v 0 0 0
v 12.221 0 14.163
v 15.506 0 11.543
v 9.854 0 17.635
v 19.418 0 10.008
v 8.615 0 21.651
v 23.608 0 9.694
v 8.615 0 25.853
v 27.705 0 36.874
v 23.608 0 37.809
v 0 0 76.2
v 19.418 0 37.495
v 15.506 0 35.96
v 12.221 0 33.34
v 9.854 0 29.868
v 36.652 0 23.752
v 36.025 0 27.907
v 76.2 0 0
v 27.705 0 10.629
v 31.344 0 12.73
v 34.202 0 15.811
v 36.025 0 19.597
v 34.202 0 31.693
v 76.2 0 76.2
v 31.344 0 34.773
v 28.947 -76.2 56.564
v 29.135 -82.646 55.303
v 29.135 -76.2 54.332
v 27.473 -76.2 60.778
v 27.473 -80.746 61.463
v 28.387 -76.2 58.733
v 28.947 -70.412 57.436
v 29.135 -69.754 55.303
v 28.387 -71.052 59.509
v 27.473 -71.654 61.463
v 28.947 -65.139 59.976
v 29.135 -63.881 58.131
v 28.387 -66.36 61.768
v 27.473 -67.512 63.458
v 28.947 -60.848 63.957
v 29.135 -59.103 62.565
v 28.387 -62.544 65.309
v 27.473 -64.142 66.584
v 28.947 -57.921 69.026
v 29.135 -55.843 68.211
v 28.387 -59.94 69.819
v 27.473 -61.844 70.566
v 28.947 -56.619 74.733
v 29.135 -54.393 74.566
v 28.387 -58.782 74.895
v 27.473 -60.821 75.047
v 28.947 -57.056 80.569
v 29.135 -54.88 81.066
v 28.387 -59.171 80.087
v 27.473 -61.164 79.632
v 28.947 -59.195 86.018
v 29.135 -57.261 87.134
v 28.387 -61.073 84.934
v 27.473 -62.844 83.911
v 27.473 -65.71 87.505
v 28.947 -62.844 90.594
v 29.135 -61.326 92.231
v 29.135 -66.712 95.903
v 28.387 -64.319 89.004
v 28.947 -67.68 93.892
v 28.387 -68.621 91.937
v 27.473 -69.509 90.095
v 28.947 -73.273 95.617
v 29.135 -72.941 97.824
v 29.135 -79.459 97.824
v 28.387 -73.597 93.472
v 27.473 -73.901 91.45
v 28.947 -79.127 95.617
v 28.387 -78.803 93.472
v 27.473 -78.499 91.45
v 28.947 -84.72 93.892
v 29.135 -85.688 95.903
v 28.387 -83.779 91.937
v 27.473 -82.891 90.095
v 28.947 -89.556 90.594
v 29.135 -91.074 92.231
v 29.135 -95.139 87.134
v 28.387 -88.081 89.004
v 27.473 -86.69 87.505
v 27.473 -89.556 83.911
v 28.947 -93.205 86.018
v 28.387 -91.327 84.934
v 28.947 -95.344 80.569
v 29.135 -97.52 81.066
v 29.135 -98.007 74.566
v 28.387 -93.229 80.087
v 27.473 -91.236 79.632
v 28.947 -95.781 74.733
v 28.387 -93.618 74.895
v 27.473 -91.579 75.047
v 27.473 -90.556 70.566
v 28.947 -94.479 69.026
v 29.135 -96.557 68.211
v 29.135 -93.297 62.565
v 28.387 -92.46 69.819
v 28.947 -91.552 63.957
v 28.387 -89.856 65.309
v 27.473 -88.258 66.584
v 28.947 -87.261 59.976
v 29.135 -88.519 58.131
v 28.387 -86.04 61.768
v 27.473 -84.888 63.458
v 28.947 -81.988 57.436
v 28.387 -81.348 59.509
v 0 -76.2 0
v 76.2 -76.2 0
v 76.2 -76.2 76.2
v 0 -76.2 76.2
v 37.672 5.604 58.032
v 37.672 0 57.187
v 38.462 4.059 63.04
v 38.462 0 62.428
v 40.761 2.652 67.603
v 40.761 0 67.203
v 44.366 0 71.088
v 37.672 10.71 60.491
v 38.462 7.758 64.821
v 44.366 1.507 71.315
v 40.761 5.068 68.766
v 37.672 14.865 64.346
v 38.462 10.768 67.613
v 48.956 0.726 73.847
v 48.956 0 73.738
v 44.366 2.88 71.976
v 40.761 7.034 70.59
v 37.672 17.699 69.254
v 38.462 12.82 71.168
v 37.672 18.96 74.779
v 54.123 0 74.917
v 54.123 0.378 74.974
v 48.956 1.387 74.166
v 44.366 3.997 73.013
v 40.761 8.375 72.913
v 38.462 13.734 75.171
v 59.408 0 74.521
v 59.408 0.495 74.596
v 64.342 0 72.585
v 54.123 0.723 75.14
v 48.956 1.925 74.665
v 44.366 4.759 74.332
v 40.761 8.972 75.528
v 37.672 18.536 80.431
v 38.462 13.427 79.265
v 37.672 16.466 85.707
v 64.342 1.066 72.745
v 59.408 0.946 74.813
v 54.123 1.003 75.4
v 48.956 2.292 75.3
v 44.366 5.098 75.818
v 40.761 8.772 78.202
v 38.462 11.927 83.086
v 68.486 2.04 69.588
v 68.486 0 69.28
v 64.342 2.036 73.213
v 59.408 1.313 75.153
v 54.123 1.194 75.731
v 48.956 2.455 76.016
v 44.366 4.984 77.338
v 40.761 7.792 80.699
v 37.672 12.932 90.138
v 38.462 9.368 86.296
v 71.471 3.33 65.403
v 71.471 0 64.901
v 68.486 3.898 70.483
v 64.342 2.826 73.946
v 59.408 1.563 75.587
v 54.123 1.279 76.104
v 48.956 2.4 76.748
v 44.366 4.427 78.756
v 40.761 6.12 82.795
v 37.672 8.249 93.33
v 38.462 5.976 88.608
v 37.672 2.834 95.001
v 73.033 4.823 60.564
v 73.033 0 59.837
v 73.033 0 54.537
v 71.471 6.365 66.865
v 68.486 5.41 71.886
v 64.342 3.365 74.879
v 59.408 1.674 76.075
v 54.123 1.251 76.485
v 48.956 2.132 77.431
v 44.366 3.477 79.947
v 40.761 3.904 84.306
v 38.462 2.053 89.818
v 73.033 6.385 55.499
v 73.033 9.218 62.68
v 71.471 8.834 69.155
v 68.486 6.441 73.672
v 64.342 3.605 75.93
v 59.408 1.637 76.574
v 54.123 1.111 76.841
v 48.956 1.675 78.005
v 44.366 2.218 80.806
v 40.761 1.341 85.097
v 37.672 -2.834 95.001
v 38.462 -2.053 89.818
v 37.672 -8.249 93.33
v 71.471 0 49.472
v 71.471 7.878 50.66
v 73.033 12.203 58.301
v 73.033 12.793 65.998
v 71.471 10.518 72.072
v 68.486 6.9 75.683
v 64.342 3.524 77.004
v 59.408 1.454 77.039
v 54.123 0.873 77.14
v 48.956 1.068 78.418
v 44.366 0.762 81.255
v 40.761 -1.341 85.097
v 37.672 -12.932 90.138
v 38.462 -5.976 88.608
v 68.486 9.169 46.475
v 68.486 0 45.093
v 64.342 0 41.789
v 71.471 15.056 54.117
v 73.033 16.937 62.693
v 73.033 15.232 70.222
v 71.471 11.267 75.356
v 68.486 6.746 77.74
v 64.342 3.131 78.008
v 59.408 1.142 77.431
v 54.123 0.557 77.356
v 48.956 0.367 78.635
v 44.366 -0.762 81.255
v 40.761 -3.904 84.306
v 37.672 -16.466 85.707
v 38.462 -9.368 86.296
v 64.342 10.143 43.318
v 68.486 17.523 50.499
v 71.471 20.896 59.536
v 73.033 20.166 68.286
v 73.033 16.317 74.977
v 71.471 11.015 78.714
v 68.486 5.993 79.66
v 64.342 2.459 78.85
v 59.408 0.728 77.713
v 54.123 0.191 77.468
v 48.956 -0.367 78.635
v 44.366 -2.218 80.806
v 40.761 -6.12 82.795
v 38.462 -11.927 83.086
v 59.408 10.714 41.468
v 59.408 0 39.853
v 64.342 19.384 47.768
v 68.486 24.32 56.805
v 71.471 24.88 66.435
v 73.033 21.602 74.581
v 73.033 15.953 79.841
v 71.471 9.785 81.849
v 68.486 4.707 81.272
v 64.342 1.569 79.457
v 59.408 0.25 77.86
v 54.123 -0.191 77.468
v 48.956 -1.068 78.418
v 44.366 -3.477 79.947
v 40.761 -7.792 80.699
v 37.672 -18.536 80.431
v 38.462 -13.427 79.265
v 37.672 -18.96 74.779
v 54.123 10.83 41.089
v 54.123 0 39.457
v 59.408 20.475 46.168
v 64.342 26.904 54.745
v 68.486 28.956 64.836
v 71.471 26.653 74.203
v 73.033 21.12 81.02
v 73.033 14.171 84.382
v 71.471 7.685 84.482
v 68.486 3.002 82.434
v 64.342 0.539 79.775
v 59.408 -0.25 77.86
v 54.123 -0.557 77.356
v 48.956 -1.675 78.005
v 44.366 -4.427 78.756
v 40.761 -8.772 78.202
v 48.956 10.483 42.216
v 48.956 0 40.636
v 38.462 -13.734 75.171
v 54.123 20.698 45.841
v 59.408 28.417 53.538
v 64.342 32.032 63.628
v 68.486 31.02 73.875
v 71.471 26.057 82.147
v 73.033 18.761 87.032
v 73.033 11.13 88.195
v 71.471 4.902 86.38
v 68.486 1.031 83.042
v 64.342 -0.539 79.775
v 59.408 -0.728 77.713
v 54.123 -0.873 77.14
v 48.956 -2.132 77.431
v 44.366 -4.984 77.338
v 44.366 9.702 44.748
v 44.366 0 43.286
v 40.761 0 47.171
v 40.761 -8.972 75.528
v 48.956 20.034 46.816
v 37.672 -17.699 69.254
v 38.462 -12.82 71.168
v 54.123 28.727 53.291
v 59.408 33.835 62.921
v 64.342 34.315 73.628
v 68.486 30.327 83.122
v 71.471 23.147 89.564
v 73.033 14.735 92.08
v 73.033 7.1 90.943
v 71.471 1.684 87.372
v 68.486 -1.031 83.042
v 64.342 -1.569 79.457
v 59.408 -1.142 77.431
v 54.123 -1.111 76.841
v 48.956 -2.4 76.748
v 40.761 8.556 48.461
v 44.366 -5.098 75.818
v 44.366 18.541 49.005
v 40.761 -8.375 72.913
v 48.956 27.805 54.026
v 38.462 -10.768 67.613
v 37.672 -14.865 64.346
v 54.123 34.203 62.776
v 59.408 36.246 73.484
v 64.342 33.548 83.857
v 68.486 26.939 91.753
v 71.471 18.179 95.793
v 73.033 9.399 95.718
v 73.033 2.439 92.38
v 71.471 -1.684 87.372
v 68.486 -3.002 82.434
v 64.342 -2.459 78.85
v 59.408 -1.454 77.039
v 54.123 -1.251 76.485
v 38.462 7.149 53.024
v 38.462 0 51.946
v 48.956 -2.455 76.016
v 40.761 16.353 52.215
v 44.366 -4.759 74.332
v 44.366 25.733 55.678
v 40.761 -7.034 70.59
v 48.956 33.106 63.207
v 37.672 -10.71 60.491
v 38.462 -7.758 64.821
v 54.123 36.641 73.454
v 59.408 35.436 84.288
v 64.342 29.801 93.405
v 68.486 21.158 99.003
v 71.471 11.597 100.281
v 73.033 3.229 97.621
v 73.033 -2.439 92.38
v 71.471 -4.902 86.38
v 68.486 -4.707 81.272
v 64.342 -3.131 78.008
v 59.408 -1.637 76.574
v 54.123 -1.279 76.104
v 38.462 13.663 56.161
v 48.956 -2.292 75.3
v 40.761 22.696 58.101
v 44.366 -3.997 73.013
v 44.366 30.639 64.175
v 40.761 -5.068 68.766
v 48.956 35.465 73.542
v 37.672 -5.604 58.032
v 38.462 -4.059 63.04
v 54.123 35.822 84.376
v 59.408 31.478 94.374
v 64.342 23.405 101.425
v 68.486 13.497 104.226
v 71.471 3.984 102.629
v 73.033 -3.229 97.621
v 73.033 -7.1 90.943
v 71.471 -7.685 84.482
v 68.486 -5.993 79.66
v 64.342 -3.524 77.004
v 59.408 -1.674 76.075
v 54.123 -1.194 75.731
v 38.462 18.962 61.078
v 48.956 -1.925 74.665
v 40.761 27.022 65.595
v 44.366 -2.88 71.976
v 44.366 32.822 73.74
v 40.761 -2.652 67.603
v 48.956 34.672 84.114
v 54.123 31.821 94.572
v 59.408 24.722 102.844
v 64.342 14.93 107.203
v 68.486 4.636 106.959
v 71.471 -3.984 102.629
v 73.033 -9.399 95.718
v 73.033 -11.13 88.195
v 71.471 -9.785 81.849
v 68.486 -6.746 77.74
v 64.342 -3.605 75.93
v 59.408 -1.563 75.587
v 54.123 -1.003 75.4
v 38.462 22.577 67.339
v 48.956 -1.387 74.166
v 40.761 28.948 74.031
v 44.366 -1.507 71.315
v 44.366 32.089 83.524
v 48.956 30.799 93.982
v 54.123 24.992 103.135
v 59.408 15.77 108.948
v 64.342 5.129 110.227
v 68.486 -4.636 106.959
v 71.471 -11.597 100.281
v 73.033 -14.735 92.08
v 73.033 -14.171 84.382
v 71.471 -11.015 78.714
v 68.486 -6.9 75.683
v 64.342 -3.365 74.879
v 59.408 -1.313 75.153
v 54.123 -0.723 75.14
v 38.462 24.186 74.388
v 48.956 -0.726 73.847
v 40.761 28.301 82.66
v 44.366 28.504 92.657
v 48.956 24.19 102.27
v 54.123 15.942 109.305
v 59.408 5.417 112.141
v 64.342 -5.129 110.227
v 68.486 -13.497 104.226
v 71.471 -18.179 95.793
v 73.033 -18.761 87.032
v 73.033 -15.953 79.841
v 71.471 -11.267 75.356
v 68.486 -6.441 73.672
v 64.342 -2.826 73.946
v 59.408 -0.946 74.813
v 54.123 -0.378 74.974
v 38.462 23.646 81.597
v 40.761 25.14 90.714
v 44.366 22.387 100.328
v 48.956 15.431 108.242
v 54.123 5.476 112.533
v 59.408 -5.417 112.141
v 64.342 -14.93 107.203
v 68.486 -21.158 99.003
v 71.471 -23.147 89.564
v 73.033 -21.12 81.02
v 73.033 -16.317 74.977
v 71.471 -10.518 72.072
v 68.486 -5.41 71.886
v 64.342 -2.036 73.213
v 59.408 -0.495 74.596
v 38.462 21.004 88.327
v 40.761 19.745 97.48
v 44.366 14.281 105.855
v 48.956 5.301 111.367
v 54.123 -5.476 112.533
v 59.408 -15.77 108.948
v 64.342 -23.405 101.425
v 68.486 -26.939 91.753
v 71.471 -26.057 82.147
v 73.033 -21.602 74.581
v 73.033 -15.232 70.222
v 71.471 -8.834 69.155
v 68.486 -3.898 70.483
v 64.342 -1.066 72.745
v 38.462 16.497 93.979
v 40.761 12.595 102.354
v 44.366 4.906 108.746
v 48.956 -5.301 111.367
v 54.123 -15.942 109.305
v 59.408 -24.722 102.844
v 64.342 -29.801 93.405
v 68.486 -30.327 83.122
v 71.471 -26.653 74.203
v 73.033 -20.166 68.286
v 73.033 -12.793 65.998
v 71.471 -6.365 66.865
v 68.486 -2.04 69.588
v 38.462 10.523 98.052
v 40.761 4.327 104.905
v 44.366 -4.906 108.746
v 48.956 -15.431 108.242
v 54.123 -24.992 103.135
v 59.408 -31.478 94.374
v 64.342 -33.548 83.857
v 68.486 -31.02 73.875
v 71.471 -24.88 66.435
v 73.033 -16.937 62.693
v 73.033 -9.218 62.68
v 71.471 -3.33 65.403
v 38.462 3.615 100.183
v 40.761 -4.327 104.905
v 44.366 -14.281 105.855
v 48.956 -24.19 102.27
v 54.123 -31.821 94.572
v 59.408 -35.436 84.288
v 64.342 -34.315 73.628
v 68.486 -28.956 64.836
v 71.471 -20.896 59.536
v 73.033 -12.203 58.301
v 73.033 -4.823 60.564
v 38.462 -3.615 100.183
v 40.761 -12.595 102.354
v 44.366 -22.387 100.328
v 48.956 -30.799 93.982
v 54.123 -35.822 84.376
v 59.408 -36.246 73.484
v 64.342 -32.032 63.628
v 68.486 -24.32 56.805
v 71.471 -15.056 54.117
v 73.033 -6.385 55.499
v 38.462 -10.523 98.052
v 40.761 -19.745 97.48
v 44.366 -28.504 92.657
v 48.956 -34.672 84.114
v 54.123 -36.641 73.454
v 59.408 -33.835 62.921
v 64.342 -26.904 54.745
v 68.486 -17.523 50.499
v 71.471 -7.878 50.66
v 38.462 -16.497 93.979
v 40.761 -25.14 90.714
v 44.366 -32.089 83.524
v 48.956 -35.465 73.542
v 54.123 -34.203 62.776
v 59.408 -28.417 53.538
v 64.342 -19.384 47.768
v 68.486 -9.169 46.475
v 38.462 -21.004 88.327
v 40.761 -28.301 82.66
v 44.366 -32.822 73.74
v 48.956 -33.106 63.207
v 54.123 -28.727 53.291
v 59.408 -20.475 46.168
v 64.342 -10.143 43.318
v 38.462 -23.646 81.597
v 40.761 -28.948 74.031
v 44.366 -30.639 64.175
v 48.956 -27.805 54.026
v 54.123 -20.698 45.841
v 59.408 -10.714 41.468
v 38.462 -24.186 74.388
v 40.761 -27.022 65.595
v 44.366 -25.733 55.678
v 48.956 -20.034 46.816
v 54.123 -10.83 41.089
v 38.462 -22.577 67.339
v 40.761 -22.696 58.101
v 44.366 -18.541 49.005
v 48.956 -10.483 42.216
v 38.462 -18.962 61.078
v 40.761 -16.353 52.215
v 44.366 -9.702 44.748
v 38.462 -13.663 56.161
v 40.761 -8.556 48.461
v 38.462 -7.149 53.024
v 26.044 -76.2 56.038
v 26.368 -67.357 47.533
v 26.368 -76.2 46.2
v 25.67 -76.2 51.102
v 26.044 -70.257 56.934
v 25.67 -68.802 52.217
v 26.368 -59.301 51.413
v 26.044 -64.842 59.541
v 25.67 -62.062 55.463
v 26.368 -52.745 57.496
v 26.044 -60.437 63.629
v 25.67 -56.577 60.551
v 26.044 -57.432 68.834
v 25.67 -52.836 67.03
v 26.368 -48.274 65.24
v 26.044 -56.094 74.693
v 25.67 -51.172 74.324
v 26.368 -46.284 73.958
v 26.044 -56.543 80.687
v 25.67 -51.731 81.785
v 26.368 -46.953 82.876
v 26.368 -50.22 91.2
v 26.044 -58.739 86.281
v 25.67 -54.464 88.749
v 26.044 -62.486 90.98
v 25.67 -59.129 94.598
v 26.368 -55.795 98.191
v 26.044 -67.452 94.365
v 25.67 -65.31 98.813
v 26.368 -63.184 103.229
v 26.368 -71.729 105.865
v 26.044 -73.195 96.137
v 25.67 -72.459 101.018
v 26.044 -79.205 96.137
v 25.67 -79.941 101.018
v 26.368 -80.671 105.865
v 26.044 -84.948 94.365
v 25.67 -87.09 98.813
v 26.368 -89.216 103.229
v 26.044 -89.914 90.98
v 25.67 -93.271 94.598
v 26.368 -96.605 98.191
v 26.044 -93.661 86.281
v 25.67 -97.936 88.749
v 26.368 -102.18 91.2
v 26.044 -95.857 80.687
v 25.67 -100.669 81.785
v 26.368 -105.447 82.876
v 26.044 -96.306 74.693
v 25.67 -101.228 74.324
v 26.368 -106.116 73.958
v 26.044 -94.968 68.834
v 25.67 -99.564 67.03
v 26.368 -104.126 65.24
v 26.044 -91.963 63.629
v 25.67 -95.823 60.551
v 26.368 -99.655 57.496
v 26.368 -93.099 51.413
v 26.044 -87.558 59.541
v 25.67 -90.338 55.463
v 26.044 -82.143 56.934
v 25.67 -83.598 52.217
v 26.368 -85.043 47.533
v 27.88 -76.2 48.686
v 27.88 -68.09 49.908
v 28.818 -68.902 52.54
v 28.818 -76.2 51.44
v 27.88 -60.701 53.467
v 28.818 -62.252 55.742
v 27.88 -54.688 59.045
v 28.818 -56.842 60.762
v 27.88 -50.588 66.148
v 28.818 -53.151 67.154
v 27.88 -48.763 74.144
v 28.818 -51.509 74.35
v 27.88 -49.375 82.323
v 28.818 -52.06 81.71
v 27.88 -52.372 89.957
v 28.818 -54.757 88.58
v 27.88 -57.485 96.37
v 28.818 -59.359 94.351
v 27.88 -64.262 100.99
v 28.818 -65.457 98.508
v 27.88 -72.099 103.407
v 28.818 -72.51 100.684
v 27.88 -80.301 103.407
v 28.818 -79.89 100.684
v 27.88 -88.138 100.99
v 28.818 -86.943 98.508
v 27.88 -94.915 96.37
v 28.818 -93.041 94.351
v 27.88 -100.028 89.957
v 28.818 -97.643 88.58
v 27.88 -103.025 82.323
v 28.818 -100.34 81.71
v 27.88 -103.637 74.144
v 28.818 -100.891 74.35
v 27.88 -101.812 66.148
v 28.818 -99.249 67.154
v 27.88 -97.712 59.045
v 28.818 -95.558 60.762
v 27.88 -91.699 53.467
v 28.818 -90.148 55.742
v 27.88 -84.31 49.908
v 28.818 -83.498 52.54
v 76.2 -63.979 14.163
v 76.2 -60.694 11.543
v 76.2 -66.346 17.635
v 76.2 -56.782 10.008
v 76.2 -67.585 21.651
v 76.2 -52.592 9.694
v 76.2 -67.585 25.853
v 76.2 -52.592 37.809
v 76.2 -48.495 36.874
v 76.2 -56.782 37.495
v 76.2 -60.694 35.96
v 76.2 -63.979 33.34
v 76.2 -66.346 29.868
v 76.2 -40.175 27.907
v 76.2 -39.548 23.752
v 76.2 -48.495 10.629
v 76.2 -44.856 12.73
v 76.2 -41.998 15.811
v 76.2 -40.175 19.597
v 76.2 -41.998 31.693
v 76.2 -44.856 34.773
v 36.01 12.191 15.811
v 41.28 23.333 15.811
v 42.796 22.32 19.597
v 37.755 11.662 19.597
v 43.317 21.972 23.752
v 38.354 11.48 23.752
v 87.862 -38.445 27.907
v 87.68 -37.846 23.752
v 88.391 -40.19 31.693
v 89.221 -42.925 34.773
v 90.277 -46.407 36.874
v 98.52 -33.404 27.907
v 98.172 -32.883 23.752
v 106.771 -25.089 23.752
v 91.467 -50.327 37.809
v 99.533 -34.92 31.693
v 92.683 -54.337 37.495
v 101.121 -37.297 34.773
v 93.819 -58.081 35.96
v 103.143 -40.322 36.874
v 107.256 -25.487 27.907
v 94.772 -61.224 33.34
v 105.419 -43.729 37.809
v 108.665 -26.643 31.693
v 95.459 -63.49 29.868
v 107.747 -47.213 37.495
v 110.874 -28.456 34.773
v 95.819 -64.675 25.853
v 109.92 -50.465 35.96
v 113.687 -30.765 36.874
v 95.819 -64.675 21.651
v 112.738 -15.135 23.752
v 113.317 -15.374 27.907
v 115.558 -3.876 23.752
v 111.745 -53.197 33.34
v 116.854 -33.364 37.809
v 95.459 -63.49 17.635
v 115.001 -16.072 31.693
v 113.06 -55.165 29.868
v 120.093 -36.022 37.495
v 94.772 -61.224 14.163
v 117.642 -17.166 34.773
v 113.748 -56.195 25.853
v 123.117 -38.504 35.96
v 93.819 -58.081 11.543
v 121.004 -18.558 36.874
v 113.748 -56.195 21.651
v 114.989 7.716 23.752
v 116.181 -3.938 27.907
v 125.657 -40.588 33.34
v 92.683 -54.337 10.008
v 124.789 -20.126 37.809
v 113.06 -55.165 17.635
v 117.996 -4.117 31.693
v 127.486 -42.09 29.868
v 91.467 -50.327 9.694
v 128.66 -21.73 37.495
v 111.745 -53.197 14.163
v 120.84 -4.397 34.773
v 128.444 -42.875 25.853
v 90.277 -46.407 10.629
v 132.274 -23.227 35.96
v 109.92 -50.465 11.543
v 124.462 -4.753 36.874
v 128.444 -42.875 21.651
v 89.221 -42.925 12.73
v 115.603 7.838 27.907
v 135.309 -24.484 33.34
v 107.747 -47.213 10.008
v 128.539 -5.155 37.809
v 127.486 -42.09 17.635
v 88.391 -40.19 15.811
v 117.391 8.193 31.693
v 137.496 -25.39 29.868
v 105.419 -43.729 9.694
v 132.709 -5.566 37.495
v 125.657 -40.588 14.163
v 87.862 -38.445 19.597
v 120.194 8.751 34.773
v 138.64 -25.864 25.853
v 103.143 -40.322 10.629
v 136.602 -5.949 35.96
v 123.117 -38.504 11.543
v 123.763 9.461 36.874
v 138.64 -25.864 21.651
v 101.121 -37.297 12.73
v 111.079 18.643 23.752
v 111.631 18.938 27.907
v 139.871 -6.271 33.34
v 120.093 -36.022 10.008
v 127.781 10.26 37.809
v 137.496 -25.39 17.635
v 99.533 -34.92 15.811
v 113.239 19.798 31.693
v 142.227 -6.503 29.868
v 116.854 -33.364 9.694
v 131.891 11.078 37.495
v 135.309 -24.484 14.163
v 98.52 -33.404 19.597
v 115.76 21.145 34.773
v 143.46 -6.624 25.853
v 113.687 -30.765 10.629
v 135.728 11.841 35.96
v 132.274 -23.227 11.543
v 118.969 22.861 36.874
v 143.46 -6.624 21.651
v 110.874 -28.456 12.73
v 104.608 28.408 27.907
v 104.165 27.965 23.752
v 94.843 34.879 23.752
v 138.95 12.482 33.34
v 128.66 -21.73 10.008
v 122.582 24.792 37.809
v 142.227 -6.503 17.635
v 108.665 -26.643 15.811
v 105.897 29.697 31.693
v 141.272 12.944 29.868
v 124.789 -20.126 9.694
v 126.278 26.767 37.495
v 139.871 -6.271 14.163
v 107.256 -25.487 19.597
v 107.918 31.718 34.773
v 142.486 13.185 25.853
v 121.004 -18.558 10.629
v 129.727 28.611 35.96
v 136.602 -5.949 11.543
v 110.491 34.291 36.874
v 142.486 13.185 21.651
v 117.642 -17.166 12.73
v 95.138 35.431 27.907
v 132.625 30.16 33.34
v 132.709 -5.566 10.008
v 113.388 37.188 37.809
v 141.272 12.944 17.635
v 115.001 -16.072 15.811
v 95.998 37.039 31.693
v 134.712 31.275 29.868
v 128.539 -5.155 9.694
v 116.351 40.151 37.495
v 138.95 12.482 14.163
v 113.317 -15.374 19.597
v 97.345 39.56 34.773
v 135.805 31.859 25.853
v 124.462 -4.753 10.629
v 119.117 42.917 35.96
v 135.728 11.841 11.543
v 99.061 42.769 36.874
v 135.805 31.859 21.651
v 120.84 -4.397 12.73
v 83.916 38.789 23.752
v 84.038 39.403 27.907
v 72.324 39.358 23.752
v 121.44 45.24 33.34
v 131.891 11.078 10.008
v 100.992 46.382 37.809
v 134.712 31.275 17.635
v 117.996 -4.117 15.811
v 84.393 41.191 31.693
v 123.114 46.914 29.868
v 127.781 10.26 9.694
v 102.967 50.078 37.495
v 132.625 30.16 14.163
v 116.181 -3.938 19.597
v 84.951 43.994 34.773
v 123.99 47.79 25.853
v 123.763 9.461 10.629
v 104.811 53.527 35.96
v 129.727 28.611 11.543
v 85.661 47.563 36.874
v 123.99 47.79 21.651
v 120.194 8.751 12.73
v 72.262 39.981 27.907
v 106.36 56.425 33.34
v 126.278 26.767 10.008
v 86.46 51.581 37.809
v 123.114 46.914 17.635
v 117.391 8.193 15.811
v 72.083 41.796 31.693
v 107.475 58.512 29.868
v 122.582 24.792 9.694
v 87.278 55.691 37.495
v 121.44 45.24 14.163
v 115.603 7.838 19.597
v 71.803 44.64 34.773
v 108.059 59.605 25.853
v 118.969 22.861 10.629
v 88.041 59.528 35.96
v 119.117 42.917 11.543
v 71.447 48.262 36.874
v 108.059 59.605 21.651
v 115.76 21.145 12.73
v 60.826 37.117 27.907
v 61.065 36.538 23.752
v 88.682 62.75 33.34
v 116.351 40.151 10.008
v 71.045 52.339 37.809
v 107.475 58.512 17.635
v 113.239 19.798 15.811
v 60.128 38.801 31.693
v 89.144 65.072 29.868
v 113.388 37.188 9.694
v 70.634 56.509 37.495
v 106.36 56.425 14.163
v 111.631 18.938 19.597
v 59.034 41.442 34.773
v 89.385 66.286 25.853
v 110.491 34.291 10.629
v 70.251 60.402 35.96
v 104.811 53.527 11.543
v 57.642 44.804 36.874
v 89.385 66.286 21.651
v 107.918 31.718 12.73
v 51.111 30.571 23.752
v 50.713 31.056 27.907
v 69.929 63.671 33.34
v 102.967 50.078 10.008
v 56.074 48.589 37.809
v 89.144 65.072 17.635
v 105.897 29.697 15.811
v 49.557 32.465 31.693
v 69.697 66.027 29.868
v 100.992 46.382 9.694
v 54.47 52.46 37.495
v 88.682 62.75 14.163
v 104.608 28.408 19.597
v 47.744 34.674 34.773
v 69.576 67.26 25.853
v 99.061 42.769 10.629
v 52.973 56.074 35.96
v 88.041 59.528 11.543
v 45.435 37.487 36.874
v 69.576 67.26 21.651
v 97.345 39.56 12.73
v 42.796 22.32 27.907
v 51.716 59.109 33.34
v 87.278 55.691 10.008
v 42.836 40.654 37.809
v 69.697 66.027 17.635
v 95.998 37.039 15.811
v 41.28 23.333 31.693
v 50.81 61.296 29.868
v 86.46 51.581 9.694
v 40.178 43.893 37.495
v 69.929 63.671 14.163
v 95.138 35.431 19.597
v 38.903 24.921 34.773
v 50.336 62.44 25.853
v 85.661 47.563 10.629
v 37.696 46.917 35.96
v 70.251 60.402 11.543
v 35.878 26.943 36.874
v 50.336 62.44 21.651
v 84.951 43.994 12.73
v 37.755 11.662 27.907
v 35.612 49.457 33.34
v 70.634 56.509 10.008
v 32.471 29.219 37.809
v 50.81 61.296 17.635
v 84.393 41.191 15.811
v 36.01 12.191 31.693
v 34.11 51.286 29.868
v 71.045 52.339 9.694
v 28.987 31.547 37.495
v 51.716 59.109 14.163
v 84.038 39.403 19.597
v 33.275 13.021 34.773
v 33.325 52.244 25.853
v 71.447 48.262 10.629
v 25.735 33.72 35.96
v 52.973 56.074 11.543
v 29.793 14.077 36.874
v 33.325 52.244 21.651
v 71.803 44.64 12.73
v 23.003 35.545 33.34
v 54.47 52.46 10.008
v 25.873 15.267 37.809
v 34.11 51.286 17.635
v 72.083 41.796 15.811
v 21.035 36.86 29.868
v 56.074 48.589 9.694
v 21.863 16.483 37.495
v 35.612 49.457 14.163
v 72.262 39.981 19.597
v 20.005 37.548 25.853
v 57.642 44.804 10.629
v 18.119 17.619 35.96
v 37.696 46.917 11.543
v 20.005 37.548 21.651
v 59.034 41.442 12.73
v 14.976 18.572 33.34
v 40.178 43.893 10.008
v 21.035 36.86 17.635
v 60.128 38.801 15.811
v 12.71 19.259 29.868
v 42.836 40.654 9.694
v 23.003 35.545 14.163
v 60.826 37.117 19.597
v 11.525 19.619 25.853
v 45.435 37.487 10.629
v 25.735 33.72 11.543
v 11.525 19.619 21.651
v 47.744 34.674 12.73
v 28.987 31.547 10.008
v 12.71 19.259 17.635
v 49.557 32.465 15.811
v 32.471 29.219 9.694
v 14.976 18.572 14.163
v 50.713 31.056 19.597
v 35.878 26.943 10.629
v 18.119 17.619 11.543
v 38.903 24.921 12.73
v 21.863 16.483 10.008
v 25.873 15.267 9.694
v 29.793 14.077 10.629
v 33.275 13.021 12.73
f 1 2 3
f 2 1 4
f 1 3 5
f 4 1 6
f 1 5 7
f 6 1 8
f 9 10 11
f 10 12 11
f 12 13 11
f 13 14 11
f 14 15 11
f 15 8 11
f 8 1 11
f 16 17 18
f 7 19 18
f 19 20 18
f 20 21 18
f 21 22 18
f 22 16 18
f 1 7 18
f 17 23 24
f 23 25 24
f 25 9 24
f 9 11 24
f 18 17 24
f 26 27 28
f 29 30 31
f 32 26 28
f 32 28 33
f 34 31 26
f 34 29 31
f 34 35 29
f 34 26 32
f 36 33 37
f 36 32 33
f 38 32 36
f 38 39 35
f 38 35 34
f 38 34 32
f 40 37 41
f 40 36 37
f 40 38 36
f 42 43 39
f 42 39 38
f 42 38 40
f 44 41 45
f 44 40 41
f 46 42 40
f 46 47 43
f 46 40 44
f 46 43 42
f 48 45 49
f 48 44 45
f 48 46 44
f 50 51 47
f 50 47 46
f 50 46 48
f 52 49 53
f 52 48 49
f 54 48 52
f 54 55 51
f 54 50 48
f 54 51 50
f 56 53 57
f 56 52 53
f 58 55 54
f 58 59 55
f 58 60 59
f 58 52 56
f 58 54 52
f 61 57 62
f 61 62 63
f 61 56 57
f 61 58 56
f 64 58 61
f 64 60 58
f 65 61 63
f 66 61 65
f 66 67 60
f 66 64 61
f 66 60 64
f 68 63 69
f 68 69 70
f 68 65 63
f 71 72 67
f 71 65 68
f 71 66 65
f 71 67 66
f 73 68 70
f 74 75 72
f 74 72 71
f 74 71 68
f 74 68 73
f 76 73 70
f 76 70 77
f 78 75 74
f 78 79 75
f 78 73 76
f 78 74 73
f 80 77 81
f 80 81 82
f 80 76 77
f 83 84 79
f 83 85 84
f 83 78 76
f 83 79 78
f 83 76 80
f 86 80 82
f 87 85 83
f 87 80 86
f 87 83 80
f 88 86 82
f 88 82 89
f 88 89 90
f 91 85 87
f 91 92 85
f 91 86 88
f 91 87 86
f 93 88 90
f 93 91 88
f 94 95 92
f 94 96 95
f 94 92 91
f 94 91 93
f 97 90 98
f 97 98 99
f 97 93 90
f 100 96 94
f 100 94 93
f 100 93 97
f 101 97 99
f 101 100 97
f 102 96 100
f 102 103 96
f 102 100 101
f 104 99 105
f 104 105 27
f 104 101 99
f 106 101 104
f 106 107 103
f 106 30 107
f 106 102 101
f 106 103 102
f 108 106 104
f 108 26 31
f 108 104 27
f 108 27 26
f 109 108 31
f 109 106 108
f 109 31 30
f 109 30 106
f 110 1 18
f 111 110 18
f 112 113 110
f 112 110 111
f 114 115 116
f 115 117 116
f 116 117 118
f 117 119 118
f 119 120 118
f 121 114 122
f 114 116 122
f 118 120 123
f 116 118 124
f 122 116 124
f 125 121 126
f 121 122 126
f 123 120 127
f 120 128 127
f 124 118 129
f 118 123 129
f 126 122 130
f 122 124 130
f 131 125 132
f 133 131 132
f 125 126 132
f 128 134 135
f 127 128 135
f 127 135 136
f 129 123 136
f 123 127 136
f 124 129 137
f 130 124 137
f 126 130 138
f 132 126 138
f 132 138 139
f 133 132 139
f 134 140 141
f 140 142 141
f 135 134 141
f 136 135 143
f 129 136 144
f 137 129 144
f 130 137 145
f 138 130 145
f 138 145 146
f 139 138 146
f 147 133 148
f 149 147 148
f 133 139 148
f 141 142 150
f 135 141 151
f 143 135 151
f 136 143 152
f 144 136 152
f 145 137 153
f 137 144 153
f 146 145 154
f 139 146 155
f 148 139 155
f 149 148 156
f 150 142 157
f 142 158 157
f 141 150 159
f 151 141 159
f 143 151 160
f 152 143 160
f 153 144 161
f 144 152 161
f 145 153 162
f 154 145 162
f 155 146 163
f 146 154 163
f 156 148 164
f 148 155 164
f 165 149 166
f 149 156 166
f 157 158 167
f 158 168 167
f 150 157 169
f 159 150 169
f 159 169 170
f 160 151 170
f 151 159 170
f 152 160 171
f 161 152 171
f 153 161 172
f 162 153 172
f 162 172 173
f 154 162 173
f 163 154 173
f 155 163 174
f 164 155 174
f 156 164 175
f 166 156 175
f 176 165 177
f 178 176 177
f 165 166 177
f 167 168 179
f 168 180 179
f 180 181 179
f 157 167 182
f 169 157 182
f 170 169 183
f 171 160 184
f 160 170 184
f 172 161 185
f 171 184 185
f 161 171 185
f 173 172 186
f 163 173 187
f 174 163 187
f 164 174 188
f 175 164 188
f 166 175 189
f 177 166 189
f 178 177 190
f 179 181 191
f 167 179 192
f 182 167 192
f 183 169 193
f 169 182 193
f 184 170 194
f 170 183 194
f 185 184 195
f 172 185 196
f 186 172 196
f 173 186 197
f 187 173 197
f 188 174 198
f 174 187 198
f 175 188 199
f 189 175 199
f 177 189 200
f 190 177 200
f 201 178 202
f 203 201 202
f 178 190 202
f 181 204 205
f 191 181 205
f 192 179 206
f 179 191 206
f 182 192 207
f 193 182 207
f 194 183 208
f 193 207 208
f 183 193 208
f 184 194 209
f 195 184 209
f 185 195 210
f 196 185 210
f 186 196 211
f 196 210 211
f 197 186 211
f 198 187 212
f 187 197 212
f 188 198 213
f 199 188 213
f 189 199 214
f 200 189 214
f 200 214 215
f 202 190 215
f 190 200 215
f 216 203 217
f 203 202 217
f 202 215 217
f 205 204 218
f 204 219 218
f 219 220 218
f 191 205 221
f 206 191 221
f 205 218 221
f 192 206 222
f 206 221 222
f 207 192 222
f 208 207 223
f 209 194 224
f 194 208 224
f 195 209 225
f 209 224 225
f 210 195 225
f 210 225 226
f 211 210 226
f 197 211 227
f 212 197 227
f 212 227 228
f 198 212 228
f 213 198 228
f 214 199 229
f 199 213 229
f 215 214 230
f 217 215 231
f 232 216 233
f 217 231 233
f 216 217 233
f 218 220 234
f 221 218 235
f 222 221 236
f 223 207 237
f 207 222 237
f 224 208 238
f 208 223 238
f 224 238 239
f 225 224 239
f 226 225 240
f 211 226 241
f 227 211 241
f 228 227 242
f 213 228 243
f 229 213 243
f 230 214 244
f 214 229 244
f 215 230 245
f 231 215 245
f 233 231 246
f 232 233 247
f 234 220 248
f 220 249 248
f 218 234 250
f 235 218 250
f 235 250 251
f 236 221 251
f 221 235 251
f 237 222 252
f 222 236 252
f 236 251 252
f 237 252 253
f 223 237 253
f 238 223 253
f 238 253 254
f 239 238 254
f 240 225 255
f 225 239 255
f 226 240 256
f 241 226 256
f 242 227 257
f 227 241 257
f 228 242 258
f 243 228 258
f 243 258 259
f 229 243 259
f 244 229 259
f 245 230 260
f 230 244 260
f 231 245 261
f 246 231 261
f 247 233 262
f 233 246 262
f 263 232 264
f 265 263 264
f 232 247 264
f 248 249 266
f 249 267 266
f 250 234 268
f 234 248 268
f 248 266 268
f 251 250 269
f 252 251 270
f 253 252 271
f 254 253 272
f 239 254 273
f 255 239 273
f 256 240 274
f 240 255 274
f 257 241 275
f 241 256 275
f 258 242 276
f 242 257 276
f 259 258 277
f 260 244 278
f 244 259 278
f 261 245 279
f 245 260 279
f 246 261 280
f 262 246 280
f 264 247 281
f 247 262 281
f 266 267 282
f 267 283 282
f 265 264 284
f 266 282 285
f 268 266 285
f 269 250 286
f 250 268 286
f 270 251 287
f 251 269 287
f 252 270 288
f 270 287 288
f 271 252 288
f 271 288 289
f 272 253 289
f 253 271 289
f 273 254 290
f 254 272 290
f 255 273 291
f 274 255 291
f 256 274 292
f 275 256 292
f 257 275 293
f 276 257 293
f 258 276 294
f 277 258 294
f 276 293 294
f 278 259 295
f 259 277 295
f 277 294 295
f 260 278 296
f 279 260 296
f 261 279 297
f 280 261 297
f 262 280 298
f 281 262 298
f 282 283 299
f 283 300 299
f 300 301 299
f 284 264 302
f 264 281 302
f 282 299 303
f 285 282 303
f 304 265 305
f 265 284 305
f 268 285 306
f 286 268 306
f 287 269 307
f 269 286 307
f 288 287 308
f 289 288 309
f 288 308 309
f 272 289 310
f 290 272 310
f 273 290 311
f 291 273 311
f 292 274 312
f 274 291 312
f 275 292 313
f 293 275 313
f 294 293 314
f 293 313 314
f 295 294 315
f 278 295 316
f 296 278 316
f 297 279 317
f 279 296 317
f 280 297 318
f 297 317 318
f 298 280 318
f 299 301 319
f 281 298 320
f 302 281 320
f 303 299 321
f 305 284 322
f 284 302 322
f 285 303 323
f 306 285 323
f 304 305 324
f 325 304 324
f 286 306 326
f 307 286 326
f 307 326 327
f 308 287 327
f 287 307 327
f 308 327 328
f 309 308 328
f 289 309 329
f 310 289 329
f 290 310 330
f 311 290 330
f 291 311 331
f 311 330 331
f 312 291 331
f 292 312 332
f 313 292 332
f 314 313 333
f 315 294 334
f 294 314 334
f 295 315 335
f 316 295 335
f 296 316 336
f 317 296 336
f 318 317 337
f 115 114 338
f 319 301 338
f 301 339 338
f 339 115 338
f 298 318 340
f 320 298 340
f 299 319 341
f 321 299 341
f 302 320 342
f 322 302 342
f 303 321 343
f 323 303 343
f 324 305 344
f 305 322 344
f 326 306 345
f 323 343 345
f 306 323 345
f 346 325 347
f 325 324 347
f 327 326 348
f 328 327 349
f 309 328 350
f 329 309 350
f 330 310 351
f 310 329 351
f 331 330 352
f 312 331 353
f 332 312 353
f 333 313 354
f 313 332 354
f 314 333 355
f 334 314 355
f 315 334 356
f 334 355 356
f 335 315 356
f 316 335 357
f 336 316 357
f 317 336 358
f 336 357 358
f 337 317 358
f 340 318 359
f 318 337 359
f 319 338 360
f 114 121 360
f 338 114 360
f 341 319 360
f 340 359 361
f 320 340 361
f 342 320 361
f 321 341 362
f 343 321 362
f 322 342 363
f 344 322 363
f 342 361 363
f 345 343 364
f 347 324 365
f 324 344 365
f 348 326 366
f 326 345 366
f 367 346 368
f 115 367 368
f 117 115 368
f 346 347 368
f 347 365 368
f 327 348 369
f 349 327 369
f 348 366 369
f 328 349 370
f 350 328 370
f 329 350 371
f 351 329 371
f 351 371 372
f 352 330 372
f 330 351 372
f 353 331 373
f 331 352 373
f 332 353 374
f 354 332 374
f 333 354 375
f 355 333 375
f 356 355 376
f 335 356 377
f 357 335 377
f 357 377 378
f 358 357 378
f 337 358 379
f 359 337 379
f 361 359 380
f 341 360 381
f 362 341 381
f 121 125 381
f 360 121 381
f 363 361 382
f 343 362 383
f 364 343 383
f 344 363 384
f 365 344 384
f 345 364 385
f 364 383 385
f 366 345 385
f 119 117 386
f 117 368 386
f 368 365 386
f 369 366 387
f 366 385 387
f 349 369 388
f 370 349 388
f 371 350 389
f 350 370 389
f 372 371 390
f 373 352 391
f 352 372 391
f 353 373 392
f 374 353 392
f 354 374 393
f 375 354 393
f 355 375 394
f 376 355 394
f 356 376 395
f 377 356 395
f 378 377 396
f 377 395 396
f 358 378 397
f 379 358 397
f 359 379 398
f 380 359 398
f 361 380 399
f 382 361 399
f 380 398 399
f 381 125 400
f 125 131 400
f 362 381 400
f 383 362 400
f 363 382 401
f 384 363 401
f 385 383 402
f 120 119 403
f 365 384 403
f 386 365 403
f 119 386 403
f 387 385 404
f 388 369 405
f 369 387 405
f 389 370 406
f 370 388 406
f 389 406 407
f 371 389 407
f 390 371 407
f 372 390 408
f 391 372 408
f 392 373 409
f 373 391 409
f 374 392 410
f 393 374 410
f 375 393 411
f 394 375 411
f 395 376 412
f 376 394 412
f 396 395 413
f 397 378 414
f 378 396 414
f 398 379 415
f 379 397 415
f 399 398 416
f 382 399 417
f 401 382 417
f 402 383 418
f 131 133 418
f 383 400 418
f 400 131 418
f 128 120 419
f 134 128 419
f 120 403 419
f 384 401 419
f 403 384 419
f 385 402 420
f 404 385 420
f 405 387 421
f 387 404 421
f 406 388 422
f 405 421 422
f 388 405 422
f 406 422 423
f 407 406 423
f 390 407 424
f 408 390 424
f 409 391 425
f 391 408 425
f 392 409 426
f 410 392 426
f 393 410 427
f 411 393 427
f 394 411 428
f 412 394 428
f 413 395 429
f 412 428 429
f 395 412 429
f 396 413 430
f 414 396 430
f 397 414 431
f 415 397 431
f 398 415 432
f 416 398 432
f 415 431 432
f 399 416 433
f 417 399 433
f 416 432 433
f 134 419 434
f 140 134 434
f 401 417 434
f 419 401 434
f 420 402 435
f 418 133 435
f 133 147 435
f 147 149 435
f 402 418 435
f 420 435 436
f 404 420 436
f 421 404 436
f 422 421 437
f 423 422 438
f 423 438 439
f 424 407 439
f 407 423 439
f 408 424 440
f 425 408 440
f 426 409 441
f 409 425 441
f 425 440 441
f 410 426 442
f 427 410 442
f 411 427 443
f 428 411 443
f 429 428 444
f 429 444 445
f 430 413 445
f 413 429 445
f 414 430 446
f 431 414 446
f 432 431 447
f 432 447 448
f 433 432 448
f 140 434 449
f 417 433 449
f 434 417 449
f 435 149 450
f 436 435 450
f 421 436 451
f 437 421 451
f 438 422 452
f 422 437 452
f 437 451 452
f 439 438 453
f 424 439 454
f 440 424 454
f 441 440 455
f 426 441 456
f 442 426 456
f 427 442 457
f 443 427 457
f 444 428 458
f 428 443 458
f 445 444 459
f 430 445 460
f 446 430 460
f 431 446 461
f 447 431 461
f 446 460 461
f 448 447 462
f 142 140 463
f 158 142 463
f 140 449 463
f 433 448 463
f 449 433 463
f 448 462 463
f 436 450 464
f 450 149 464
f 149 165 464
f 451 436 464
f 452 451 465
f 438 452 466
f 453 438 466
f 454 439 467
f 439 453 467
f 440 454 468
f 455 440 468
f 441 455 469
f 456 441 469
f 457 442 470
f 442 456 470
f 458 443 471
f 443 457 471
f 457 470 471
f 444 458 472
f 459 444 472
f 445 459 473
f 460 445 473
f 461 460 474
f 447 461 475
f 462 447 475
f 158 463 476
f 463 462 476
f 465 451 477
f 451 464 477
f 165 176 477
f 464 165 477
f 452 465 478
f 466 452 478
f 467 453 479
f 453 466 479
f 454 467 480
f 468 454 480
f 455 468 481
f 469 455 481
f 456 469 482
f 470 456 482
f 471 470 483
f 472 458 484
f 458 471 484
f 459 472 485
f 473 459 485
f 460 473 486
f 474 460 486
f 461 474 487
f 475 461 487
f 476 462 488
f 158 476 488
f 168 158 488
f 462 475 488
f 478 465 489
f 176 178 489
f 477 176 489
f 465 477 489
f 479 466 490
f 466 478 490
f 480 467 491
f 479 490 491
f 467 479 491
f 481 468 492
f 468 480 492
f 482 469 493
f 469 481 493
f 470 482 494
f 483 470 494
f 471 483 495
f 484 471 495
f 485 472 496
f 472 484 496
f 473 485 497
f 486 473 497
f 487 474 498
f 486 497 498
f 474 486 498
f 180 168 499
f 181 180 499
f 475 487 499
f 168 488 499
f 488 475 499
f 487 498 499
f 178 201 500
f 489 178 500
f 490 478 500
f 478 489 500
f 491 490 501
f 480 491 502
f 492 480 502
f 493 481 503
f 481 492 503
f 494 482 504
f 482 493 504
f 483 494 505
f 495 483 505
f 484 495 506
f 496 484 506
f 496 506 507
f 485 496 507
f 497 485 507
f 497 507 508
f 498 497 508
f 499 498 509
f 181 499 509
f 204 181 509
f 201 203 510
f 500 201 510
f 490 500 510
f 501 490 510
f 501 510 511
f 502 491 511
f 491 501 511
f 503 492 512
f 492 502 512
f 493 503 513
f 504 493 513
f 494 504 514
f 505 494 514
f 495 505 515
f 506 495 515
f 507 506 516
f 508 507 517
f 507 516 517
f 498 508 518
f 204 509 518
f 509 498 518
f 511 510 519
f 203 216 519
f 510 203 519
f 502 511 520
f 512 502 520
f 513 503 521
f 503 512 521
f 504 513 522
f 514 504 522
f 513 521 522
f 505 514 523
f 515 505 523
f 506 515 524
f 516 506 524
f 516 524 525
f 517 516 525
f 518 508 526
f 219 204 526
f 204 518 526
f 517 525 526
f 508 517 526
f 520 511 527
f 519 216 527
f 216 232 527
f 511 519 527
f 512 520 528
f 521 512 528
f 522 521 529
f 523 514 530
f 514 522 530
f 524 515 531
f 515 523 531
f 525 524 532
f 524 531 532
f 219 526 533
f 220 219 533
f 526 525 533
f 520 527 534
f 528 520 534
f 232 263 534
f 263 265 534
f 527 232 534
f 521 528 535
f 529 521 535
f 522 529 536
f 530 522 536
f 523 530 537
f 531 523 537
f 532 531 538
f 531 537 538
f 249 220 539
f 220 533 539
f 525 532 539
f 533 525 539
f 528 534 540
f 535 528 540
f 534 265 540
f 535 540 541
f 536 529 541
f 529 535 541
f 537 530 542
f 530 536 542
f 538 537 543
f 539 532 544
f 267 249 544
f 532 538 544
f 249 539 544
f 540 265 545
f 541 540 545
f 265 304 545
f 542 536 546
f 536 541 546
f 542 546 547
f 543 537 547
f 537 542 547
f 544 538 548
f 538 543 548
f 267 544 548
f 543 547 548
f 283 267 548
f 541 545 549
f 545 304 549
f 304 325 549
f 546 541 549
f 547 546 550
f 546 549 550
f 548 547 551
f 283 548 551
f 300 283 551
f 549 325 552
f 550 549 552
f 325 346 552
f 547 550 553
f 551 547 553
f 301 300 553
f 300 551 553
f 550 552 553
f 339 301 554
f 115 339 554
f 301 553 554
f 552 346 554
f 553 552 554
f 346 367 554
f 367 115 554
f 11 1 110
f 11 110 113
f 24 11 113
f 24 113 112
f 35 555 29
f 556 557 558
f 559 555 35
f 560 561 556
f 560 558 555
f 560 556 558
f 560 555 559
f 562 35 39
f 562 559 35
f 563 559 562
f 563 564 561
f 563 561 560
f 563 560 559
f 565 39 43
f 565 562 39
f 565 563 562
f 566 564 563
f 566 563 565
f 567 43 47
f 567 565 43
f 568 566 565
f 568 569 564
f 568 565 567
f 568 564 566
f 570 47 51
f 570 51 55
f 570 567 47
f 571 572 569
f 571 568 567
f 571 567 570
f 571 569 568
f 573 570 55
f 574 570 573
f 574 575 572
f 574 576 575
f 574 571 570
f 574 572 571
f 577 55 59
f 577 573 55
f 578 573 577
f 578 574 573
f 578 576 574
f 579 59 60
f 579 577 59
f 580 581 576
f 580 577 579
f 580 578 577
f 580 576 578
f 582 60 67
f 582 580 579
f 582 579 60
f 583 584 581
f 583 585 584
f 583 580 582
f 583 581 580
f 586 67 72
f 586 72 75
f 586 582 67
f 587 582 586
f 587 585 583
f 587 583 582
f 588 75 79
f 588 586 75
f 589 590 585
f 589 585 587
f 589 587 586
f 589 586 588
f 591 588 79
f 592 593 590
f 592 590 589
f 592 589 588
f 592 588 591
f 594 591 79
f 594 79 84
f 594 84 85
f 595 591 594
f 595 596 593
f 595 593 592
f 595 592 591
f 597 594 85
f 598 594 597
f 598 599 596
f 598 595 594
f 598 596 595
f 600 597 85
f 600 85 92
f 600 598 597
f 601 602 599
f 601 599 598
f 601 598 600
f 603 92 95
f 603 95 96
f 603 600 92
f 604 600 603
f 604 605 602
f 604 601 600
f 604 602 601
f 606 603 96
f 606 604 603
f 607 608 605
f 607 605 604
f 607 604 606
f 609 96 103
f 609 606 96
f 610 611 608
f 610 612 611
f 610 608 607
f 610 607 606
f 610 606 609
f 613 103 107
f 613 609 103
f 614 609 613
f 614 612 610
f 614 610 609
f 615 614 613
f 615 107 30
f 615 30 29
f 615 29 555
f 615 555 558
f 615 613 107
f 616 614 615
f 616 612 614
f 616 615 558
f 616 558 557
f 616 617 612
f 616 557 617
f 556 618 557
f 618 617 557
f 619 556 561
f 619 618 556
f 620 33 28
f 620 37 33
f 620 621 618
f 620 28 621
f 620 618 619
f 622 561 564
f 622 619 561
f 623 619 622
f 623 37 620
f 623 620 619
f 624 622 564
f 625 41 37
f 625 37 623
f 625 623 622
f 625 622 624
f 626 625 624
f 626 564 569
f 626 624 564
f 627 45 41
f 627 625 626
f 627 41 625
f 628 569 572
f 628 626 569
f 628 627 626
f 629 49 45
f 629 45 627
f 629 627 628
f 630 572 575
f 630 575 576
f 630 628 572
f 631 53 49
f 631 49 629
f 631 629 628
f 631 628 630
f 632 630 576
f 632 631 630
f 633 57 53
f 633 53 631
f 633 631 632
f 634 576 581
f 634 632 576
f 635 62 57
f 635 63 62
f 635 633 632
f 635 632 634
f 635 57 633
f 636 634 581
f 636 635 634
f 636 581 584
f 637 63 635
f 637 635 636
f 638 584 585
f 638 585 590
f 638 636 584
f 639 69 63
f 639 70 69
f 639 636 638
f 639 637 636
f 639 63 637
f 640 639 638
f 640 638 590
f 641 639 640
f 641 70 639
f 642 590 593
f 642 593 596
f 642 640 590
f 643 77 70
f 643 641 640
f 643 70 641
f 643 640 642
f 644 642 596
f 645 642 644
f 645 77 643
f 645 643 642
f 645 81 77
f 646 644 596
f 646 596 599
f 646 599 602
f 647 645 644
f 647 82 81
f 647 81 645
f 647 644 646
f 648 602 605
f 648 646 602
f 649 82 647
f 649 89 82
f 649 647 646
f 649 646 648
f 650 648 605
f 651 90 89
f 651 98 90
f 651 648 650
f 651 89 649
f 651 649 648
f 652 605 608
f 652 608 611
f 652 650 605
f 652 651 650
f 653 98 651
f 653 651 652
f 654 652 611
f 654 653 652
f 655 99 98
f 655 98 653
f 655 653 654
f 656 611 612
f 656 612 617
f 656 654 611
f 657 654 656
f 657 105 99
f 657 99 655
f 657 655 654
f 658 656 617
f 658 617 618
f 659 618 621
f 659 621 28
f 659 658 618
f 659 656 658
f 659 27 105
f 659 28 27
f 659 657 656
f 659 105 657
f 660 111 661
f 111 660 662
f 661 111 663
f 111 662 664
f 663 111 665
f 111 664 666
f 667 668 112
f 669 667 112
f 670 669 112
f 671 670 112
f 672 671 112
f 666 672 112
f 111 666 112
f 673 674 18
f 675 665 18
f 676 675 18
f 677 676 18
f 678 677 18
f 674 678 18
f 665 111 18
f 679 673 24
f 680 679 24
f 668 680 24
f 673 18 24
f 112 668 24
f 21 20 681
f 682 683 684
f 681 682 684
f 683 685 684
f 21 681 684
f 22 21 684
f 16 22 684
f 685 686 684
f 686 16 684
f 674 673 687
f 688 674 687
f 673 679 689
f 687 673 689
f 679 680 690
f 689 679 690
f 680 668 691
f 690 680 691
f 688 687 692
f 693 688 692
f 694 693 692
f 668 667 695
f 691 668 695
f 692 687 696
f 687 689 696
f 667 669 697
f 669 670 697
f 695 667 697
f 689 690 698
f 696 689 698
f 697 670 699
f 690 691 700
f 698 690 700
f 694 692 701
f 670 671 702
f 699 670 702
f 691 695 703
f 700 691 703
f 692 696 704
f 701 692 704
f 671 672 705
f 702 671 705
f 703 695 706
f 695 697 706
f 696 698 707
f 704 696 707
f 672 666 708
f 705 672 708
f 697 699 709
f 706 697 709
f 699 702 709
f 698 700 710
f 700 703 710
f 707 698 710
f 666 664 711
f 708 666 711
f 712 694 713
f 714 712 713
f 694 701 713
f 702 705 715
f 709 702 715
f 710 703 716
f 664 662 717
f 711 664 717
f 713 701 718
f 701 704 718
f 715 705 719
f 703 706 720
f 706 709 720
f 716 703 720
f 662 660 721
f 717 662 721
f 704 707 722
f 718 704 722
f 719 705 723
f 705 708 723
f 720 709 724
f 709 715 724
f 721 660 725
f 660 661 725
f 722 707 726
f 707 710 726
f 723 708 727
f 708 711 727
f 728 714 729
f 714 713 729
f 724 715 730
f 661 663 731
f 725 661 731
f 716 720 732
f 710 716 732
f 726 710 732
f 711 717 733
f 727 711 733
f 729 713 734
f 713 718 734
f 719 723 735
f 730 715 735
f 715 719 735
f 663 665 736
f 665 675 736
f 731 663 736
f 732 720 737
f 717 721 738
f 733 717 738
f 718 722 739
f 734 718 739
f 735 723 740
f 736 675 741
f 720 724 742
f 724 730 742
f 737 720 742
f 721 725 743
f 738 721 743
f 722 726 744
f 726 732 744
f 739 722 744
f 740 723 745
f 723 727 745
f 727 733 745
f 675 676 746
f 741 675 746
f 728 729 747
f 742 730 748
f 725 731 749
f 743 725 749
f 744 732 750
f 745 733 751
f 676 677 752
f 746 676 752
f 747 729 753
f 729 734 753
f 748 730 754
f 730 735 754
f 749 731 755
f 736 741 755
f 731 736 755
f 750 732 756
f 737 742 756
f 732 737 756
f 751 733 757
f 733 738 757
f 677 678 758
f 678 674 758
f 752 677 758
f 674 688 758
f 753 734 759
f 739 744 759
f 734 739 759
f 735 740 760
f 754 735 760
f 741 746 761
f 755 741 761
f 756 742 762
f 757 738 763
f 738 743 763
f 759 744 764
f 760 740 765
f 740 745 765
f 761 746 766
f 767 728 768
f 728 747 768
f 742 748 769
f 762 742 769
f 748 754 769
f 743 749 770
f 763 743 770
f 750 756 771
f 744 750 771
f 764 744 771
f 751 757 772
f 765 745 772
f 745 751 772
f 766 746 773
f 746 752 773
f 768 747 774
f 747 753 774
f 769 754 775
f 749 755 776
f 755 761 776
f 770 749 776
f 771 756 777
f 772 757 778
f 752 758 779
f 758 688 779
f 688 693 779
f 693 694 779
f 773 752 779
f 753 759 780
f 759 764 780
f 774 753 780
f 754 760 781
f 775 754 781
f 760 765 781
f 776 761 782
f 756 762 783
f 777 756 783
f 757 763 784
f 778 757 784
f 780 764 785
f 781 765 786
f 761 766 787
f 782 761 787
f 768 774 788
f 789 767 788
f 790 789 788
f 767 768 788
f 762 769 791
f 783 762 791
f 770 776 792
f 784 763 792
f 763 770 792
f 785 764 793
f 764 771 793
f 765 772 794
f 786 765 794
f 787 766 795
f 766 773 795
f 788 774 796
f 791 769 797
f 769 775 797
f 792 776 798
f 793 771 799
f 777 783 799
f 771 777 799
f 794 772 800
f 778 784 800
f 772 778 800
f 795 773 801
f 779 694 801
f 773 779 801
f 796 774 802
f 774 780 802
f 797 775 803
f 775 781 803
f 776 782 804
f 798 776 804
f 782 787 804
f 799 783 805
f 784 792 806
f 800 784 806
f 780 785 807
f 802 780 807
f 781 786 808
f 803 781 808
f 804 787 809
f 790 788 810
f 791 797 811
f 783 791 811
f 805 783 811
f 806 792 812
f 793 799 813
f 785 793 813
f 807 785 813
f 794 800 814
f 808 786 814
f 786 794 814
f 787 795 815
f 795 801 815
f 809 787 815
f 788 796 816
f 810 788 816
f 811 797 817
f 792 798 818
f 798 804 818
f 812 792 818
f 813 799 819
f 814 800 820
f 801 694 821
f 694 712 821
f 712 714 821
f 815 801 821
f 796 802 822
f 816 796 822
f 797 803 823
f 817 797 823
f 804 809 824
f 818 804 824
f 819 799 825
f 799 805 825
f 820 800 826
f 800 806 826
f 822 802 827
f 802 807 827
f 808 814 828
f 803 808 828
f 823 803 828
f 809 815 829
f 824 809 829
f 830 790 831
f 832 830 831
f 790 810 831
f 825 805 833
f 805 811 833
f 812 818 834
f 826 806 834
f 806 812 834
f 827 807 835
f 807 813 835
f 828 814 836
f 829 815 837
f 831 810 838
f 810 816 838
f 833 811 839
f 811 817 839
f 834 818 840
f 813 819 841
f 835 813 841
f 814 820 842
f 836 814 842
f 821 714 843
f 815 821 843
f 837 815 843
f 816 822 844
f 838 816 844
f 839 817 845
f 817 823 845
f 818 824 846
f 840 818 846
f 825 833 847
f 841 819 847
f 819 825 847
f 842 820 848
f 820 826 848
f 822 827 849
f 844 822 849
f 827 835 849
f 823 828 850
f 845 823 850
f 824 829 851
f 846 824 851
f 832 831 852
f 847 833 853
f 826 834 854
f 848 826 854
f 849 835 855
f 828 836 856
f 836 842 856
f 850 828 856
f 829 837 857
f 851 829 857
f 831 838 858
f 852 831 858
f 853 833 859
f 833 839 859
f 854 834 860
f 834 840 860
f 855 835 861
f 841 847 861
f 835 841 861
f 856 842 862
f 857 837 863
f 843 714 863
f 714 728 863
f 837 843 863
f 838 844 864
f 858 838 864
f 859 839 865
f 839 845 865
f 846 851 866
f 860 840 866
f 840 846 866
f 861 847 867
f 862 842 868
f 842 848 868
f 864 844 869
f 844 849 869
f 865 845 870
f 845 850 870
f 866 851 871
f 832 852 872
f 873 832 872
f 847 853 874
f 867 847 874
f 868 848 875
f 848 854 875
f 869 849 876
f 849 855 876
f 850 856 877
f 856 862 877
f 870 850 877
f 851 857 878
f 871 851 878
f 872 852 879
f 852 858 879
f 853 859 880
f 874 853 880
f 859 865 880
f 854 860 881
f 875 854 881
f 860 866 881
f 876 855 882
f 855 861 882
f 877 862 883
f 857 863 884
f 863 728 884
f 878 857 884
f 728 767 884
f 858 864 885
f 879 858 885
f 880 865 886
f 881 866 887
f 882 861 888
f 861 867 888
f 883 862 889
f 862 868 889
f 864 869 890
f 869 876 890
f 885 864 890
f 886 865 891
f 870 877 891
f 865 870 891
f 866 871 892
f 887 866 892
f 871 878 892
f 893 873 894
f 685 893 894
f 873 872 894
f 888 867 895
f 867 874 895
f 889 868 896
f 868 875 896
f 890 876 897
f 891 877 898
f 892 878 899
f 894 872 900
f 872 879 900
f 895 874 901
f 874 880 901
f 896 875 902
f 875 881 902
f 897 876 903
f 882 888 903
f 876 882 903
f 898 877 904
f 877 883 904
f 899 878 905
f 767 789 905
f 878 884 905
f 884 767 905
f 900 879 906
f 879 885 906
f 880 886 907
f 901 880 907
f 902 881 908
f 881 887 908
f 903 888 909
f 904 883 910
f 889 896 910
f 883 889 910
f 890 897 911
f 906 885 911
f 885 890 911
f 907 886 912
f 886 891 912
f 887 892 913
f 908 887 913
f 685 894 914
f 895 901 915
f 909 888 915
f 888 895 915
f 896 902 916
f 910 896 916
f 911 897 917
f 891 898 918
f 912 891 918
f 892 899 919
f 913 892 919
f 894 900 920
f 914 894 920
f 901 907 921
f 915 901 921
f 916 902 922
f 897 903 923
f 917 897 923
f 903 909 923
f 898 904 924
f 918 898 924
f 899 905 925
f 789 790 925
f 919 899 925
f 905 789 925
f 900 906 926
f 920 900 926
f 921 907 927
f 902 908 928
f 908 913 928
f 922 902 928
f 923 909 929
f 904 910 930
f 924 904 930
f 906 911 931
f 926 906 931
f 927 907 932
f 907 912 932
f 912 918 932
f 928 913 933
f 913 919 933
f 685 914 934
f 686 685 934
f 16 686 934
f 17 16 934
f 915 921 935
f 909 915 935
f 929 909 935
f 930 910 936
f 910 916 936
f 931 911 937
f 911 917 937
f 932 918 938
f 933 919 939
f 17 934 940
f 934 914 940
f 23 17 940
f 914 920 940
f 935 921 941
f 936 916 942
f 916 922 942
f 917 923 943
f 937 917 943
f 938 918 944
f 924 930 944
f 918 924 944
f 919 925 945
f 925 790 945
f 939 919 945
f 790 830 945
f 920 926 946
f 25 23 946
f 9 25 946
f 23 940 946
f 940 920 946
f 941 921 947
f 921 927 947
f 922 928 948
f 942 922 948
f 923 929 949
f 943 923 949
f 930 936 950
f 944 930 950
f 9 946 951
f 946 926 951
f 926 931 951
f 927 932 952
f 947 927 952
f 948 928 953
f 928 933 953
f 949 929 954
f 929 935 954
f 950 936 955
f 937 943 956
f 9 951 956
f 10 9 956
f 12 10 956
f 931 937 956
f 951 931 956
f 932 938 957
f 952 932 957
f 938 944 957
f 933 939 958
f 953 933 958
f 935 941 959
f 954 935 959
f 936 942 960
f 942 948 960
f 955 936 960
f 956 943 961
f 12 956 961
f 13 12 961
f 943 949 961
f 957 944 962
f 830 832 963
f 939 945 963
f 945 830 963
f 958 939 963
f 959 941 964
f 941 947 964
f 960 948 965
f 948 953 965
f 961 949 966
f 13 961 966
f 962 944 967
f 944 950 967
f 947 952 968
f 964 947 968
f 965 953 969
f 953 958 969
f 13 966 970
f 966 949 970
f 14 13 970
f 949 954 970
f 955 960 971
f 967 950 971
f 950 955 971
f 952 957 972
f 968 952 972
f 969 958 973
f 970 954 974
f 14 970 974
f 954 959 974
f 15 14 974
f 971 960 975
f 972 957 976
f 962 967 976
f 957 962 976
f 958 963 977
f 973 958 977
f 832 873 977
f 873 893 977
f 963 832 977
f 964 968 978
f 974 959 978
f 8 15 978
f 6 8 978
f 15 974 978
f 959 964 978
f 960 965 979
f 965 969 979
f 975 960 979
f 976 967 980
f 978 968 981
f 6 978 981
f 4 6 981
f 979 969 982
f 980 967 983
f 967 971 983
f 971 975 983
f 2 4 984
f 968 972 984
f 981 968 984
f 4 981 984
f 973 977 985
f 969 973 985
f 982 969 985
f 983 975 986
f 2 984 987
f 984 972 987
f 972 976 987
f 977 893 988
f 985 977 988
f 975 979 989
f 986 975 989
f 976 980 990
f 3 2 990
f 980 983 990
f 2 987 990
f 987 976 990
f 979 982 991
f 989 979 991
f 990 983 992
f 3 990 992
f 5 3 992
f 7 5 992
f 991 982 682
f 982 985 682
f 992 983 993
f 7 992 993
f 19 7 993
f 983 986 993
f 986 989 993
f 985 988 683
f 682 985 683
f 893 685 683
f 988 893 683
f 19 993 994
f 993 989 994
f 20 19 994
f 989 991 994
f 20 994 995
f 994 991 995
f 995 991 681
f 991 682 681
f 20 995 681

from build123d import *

# Parameters (mm, degrees)
F0_W     = 76.2
F0_H     = 76.2
F1_DEPTH = 76.2
F2_R     = 13.3290847302
F4_R     = 17.78
F6_R     = 22.86
F9_R     = 14.0969951111


with BuildPart() as f1:
    # F0 (on Front) → F1 (new body)
    with BuildSketch(Plane.XZ):
        with Locations((38.1, 38.1)):
            Rectangle(F0_W, F0_H)
    extrude(amount=F1_DEPTH)

    # F9 (on face) → F10 (revolve)
    with BuildSketch(Plane.YZ.offset(76.2)):
        with Locations((-53.6454692483, 23.7518046051)):
            Circle(F9_R)
    revolve(axis=Axis((76.2, 0, 38.1), (0, 0, 1)))


with BuildPart() as f3:
    # F2 (on face) → F3 (revolve)
    with BuildSketch(Plane.XZ.offset(76.2)):
        with Locations((15.8059280366, 54.3315932155)):
            Circle(F2_R)
    revolve(axis=Axis((38.1, -76.2, 76.2), (1, 0, 0)))


with BuildPart() as f5:
    # F4 (on face) → F5 (revolve)
    with BuildSketch(Plane(origin=(0, 0, 0), x_dir=(-1, 0, 0), z_dir=(0, 1, 0))):
        with Locations((-55.4519928992, 57.1869499981)):
            Circle(F4_R)
    revolve(axis=Axis((38.1, 0, 76.2), (1, 0, 0)))


with BuildPart() as f7:
    # F6 (on face) → F7 (revolve)
    with BuildSketch(Plane.XZ.offset(76.2)):
        with Locations((48.517961055, 51.851965487)):
            Circle(F6_R)
    revolve(axis=Axis((38.1, -76.2, 76.2), (1, 0, 0)))

    # F8: intersect F3
    add(f3.part, mode=Mode.INTERSECT)


solid = Compound([f1.part, f5.part, f7.part])
